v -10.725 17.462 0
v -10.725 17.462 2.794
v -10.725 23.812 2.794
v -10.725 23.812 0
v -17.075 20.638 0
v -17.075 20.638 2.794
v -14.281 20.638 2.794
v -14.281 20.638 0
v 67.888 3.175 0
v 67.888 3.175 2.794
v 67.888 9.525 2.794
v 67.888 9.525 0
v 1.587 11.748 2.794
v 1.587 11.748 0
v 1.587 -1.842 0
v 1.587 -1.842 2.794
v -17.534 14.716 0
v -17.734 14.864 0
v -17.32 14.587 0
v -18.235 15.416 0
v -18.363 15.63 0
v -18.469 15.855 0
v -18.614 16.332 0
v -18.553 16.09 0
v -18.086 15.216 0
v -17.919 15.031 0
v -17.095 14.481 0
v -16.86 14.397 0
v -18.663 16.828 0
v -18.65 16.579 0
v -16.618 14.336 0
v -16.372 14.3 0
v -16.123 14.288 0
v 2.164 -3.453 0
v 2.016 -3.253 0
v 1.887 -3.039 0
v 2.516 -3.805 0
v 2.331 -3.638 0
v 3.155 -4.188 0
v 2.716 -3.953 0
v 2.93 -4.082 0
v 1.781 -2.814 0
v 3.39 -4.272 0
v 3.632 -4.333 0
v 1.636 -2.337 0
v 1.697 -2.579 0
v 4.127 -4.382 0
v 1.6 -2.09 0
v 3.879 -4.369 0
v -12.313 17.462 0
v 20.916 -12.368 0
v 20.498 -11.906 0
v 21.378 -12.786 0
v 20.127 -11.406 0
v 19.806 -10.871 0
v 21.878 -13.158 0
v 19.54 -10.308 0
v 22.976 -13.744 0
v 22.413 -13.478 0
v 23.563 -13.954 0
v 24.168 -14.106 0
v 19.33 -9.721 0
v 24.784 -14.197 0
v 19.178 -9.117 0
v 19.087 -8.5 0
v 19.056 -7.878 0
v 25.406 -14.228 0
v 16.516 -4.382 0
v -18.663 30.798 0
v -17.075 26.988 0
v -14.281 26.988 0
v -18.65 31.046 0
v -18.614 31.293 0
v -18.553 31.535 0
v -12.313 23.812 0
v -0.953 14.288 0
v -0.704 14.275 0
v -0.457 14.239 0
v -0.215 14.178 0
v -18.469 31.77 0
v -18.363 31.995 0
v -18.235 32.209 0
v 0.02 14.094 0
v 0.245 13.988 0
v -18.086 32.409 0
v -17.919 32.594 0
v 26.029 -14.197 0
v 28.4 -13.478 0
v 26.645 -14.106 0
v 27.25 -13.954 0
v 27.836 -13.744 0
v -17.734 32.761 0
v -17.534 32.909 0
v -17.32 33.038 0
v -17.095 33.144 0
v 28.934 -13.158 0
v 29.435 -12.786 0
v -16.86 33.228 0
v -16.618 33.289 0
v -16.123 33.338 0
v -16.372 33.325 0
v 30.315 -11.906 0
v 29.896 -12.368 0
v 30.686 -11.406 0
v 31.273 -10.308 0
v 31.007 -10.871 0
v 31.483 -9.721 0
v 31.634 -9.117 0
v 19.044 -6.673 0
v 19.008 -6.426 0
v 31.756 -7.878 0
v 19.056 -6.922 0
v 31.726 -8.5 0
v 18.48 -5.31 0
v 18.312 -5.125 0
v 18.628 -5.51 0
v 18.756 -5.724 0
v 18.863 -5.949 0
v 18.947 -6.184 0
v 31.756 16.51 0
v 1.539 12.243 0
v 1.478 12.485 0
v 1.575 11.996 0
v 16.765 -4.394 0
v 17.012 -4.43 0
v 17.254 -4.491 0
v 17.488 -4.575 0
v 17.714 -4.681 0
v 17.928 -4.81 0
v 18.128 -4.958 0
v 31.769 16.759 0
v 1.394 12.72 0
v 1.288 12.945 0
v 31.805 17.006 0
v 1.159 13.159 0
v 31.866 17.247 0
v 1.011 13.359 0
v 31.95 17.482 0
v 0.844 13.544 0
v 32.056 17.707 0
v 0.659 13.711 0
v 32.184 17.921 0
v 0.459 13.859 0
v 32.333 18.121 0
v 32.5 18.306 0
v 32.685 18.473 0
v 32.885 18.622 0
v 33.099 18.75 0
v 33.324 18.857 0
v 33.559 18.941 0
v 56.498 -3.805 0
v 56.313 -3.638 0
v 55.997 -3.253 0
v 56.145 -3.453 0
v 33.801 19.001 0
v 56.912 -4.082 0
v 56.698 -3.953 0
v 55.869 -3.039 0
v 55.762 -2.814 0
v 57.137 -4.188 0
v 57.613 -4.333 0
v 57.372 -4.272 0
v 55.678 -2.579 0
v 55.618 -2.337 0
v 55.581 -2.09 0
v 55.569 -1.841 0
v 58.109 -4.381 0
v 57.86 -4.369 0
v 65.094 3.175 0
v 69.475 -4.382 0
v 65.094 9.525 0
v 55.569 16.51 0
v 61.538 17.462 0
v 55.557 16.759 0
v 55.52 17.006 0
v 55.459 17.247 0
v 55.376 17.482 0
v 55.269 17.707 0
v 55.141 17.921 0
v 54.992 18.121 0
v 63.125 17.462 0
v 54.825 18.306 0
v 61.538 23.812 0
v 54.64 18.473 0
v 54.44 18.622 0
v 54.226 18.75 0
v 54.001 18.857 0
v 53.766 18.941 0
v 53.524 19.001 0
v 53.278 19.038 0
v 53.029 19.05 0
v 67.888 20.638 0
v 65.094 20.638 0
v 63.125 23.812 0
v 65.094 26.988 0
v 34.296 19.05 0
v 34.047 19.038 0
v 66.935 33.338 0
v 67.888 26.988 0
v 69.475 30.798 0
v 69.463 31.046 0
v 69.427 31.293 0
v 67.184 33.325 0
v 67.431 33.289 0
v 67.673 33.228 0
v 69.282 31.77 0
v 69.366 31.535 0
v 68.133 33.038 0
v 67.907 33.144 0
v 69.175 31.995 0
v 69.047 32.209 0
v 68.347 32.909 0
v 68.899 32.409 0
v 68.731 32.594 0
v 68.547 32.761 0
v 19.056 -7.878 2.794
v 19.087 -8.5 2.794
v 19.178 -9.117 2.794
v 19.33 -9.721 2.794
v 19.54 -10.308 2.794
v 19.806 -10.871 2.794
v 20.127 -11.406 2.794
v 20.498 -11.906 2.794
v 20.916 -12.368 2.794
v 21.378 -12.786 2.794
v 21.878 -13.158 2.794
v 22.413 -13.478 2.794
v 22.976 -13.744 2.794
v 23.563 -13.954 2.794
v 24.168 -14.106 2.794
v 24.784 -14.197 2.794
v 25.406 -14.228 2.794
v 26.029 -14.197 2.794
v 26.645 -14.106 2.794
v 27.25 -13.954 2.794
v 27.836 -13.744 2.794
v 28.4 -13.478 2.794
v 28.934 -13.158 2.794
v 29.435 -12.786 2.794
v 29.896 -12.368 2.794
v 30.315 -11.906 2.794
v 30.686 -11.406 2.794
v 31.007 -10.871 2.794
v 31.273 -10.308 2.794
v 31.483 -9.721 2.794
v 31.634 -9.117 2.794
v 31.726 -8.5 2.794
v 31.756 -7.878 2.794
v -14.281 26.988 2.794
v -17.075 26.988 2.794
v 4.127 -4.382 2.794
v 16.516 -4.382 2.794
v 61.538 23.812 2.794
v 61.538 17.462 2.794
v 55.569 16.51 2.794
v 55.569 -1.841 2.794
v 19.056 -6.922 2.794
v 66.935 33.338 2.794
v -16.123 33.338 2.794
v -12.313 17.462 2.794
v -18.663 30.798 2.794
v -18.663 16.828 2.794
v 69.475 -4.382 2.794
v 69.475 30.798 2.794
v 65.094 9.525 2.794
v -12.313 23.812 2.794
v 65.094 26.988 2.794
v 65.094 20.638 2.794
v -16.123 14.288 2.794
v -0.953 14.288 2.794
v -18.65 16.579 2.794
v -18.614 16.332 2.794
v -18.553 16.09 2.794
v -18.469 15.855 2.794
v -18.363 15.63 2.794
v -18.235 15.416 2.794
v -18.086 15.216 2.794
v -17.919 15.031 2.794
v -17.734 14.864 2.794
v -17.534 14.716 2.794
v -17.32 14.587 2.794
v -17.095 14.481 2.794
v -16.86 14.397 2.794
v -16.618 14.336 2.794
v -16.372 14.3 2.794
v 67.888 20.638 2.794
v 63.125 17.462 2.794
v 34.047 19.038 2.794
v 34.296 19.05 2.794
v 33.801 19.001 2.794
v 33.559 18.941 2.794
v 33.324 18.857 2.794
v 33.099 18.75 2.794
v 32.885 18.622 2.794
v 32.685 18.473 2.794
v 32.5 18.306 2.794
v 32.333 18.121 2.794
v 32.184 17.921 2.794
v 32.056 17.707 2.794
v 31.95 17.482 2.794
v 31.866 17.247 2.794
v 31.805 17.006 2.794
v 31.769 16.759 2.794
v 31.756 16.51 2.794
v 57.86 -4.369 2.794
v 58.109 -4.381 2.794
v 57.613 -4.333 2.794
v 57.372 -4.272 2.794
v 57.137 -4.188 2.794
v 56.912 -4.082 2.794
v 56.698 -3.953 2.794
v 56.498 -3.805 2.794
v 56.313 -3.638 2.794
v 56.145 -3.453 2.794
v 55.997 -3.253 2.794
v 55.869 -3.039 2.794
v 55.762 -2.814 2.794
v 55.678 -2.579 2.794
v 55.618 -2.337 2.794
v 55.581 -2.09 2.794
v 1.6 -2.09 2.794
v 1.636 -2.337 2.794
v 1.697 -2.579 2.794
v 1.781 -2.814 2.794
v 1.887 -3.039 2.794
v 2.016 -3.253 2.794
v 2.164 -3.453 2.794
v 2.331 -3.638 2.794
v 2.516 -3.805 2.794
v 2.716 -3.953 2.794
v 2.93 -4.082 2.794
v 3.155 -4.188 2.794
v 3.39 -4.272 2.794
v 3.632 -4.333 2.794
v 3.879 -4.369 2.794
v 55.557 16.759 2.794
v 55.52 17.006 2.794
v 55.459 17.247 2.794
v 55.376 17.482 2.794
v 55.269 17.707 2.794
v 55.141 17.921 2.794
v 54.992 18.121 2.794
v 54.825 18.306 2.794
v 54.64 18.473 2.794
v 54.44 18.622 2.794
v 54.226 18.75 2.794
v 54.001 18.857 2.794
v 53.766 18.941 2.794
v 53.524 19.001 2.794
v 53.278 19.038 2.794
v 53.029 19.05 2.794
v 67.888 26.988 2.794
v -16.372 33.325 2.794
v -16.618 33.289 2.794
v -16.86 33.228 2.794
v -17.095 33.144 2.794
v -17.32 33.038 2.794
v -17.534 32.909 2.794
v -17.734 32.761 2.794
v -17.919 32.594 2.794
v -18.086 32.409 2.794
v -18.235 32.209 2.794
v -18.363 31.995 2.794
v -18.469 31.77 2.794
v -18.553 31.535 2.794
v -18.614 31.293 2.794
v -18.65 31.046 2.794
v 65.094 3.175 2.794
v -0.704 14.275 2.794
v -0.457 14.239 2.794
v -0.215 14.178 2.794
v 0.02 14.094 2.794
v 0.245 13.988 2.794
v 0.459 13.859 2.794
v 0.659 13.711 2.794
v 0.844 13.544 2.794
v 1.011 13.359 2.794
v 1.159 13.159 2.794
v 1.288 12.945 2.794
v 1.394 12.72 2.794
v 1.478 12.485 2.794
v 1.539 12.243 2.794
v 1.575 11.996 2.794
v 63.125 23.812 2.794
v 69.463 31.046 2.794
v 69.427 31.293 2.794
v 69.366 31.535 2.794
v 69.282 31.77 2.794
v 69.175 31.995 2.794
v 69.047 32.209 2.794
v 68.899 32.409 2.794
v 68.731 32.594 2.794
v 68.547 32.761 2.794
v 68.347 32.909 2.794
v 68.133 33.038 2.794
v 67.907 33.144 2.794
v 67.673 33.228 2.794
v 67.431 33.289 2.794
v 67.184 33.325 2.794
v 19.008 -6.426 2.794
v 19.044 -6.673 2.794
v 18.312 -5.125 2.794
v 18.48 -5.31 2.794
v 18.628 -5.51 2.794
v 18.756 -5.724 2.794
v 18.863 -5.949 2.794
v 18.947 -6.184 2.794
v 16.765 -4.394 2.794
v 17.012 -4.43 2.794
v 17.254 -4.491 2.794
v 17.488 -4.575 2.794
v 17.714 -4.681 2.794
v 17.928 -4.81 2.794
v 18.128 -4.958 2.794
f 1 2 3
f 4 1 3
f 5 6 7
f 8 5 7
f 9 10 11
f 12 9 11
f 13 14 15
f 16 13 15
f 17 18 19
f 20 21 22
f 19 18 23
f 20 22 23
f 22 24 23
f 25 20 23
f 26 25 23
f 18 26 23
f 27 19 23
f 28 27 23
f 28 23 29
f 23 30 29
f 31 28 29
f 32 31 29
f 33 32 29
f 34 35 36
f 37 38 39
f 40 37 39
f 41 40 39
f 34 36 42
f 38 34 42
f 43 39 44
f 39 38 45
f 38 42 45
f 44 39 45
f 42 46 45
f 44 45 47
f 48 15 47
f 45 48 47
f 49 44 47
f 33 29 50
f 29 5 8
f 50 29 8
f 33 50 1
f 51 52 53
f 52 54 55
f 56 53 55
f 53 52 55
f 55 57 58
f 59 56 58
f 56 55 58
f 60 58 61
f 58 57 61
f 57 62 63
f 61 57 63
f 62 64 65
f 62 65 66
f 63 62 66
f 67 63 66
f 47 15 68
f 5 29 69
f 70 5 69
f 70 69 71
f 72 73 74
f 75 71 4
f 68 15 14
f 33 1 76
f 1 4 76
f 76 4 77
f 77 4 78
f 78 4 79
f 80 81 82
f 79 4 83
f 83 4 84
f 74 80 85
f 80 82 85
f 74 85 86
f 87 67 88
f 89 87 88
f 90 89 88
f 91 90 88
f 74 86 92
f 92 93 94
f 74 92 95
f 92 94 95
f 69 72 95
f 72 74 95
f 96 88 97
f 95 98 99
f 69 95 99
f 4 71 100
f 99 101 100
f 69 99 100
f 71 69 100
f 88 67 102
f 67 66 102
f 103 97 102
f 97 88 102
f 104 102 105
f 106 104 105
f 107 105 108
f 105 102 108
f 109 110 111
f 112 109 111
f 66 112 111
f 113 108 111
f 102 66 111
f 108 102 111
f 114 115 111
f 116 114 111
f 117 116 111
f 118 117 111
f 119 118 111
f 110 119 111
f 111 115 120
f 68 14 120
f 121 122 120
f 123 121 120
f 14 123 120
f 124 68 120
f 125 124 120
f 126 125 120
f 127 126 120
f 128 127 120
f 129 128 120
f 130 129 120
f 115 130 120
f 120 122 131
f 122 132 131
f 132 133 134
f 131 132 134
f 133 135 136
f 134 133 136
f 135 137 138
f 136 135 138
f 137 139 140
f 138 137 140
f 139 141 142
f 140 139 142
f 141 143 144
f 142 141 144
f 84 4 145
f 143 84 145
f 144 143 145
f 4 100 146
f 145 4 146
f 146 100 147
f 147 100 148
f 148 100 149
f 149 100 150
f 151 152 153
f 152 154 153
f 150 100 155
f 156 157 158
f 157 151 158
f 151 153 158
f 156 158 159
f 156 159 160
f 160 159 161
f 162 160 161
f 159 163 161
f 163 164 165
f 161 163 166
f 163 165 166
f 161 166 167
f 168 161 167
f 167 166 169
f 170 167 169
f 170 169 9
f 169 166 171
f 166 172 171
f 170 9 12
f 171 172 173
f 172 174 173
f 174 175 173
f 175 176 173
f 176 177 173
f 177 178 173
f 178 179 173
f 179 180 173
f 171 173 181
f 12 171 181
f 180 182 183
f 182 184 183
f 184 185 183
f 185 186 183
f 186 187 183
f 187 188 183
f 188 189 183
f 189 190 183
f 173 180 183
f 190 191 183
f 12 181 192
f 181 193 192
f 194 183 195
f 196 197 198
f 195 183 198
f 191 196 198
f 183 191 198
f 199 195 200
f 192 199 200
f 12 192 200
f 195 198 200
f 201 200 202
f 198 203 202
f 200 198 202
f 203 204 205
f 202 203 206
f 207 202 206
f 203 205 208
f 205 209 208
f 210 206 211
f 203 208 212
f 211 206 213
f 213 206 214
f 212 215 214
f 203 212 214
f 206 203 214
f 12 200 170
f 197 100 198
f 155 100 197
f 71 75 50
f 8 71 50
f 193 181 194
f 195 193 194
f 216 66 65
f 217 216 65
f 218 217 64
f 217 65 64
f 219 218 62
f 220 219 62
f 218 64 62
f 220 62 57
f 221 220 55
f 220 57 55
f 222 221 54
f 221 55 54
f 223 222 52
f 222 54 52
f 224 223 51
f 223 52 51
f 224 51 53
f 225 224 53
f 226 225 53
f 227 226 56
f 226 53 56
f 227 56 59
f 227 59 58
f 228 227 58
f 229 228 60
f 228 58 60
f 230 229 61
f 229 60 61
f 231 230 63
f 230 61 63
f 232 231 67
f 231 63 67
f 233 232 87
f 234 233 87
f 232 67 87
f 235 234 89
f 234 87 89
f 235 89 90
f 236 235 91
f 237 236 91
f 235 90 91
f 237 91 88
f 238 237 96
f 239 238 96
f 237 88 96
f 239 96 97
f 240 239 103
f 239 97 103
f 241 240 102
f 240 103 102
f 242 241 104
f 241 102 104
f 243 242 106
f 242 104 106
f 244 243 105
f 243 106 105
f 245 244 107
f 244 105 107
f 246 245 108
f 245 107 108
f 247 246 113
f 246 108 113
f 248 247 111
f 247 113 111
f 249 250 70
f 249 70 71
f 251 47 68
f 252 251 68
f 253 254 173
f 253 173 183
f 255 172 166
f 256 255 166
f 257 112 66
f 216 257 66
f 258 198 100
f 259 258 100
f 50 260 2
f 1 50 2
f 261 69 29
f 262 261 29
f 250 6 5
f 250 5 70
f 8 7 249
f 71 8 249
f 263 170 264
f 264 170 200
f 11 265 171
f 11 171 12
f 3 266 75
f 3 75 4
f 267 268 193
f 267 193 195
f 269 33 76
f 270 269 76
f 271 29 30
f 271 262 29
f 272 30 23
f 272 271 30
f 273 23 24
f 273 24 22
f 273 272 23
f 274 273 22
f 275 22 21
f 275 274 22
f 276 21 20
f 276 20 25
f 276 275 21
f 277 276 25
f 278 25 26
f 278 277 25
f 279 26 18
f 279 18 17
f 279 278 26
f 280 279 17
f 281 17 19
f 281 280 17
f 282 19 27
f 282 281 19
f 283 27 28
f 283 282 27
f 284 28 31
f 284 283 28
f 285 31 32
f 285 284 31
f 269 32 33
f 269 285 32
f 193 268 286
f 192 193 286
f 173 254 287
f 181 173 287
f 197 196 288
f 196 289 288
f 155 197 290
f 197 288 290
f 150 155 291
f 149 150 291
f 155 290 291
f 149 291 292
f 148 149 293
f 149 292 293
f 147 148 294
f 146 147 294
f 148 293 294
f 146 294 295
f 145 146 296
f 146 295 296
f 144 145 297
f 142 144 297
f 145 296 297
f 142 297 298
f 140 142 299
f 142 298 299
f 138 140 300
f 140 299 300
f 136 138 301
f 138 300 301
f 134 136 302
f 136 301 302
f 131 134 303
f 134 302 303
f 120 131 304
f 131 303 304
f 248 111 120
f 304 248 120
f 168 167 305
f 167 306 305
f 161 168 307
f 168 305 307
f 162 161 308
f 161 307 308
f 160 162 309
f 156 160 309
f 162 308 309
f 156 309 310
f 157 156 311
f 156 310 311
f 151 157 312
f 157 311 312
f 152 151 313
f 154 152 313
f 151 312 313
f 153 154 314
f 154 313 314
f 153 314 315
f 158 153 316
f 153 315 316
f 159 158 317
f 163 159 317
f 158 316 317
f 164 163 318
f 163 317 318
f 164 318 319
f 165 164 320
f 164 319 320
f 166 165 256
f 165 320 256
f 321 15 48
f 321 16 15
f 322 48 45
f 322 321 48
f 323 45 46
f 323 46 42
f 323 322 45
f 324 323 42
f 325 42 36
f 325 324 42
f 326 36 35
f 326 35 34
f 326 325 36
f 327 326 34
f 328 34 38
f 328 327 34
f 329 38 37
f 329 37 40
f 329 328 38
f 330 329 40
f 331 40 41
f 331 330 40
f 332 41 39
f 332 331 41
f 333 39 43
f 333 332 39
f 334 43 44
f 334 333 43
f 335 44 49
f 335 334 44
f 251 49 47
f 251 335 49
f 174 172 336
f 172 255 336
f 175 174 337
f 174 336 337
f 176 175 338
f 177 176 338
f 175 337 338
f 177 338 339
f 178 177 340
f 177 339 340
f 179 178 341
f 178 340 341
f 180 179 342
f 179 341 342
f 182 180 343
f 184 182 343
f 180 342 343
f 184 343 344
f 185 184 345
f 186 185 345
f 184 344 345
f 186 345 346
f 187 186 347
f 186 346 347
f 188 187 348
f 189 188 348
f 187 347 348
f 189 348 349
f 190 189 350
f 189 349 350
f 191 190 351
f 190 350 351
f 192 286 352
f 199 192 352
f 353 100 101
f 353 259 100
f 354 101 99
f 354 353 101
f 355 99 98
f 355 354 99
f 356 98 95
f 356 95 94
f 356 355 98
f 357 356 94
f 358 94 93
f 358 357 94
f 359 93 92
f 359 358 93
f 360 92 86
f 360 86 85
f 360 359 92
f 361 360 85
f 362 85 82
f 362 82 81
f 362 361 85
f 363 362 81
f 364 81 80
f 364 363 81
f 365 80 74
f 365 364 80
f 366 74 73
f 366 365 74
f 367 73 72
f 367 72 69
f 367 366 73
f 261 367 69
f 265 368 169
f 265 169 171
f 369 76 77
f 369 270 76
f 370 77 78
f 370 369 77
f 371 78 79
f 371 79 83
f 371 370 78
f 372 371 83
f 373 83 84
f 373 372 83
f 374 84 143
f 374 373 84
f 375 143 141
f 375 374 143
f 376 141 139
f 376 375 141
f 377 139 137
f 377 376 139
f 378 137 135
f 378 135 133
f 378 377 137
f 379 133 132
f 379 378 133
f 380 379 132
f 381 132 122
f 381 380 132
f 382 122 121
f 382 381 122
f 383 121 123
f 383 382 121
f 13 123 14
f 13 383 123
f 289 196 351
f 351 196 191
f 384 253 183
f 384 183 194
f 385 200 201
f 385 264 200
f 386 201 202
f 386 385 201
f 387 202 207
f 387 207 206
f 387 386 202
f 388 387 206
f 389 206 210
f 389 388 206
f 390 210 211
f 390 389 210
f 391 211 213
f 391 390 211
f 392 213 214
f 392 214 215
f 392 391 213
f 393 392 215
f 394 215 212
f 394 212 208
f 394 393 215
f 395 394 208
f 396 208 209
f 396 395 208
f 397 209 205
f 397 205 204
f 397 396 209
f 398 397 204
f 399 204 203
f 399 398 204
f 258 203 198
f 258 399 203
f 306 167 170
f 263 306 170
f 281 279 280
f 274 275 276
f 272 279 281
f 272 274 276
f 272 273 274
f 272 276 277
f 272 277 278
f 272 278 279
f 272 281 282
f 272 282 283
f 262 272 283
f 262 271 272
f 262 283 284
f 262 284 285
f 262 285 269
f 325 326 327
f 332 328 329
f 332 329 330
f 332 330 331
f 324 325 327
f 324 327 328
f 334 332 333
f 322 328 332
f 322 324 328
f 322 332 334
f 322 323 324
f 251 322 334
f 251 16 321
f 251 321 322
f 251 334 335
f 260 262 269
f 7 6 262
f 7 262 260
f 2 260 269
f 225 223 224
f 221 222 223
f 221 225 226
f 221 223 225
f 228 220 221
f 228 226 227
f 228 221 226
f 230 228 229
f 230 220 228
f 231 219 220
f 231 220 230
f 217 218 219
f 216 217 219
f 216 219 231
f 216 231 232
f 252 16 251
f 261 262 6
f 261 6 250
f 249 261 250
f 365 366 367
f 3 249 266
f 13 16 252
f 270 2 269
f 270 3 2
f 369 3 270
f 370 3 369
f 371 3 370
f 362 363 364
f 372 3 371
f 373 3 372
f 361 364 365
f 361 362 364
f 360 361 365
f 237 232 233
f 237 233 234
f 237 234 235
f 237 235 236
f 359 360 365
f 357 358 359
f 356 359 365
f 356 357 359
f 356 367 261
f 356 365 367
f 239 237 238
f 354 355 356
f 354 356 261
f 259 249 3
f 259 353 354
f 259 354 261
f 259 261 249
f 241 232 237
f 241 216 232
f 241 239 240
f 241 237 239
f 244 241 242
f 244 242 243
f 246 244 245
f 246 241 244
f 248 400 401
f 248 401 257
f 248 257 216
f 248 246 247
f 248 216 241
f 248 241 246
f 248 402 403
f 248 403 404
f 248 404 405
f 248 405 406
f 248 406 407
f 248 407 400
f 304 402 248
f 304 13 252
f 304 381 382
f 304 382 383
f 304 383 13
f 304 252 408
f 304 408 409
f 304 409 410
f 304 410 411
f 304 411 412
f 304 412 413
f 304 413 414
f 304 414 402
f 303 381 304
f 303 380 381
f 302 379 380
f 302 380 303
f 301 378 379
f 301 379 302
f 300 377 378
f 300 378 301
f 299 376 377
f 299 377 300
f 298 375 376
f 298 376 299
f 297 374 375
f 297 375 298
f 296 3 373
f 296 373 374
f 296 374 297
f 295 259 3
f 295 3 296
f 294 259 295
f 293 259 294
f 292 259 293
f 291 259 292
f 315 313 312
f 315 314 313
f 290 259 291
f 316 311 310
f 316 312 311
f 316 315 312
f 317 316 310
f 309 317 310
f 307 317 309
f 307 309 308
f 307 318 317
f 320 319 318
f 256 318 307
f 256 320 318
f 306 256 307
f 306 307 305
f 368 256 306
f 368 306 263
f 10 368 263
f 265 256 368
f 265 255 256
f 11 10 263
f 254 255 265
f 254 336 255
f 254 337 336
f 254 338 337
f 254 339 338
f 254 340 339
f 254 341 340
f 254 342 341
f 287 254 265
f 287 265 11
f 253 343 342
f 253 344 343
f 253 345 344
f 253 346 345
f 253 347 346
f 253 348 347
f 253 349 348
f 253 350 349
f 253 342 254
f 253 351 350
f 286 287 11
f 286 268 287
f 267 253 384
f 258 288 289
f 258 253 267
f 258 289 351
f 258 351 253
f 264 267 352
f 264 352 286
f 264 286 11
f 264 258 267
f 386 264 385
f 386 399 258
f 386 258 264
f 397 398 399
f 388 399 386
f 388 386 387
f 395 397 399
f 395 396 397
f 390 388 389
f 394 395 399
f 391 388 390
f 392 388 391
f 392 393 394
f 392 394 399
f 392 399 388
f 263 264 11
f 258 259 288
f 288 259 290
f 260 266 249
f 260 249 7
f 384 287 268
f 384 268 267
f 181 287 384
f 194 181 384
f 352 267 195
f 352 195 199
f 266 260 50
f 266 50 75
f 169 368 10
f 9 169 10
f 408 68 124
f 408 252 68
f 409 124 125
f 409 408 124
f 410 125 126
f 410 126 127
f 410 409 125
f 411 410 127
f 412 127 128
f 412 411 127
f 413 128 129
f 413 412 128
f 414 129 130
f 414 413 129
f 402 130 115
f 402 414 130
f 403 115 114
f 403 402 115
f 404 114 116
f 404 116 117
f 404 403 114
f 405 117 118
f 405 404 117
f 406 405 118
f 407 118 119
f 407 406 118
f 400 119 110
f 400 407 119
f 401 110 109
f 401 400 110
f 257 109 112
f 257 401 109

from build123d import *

# Parameters (mm, degrees)
BOSS_EXTRUDE1_DEPTH = 2.794
SKETCH3_W           = 2.794
SKETCH3_H           = 6.35
SKETCH3_W_2         = 1.5875
CUT_EXTRUDE1_DEPTH  = 78.110446656
FILLET1_R           = 2.54


with BuildPart() as part:
    # Sketch1 → Boss-Extrude1 (new body)
    with BuildSketch(Plane.XY):
        with BuildLine():
            Line((69.475359958, -4.3815), (69.475359958, 33.3375))
            Line((69.475359958, 33.3375), (-18.662640042, 33.3375))
            Line((-18.662640042, 33.3375), (-18.662640042, 14.2875))
            Line((-18.662640042, 14.2875), (1.5875, 14.2875))
            Line((1.5875, 14.2875), (1.5875, -4.3815))
            Line((1.5875, -4.3815), (19.056359958, -4.3815))
            Line((19.056359958, -4.3815), (19.056359958, -7.8778))
            ThreePointArc((19.056359958, -7.8778), (25.406359958, -14.2278), (31.756359958, -7.8778))
            Line((31.756359958, -7.8778), (31.756359958, 19.05))
            Line((31.756359958, 19.05), (55.568859958, 19.05))
            Line((55.568859958, 19.05), (55.568859958, -4.3815))
            Line((55.568859958, -4.3815), (69.475359958, -4.3815))
        make_face()
    extrude(amount=BOSS_EXTRUDE1_DEPTH)

    # Sketch3 → Cut-Extrude1 (cut, through all)
    with BuildSketch(Plane.XY.offset(2.794)):
        with Locations((-15.678140042, 23.8125)):
            Rectangle(SKETCH3_W, SKETCH3_H)
        with Locations((66.490859958, 23.8125)):
            Rectangle(SKETCH3_W, SKETCH3_H)
        with Locations((66.490859958, 6.35)):
            Rectangle(SKETCH3_W, SKETCH3_H)
        with Locations((-11.518890042, 20.6375)):
            Rectangle(SKETCH3_W_2, SKETCH3_H)
        with Locations((62.331609958, 20.6375)):
            Rectangle(SKETCH3_W_2, SKETCH3_H)
    extrude(amount=-CUT_EXTRUDE1_DEPTH, mode=Mode.SUBTRACT)

    # Fillet1
    fillet1_edges = [part.edges().sort_by_distance(p)[0] for p in [
        (55.568859958, -4.3815, 1.397),
        (55.568859958, 19.05, 1.397),
        (31.756359958, 19.05, 1.397),
        (19.056359958, -4.3815, 1.397),
        (1.5875, -4.3815, 1.397),
        (1.5875, 14.2875, 1.397),
        (-18.662640042, 14.2875, 1.397),
        (-18.662640042, 33.3375, 1.397),
        (69.475359958, 33.3375, 1.397),
    ]]
    fillet(fillet1_edges, radius=FILLET1_R)


solid = part.part
